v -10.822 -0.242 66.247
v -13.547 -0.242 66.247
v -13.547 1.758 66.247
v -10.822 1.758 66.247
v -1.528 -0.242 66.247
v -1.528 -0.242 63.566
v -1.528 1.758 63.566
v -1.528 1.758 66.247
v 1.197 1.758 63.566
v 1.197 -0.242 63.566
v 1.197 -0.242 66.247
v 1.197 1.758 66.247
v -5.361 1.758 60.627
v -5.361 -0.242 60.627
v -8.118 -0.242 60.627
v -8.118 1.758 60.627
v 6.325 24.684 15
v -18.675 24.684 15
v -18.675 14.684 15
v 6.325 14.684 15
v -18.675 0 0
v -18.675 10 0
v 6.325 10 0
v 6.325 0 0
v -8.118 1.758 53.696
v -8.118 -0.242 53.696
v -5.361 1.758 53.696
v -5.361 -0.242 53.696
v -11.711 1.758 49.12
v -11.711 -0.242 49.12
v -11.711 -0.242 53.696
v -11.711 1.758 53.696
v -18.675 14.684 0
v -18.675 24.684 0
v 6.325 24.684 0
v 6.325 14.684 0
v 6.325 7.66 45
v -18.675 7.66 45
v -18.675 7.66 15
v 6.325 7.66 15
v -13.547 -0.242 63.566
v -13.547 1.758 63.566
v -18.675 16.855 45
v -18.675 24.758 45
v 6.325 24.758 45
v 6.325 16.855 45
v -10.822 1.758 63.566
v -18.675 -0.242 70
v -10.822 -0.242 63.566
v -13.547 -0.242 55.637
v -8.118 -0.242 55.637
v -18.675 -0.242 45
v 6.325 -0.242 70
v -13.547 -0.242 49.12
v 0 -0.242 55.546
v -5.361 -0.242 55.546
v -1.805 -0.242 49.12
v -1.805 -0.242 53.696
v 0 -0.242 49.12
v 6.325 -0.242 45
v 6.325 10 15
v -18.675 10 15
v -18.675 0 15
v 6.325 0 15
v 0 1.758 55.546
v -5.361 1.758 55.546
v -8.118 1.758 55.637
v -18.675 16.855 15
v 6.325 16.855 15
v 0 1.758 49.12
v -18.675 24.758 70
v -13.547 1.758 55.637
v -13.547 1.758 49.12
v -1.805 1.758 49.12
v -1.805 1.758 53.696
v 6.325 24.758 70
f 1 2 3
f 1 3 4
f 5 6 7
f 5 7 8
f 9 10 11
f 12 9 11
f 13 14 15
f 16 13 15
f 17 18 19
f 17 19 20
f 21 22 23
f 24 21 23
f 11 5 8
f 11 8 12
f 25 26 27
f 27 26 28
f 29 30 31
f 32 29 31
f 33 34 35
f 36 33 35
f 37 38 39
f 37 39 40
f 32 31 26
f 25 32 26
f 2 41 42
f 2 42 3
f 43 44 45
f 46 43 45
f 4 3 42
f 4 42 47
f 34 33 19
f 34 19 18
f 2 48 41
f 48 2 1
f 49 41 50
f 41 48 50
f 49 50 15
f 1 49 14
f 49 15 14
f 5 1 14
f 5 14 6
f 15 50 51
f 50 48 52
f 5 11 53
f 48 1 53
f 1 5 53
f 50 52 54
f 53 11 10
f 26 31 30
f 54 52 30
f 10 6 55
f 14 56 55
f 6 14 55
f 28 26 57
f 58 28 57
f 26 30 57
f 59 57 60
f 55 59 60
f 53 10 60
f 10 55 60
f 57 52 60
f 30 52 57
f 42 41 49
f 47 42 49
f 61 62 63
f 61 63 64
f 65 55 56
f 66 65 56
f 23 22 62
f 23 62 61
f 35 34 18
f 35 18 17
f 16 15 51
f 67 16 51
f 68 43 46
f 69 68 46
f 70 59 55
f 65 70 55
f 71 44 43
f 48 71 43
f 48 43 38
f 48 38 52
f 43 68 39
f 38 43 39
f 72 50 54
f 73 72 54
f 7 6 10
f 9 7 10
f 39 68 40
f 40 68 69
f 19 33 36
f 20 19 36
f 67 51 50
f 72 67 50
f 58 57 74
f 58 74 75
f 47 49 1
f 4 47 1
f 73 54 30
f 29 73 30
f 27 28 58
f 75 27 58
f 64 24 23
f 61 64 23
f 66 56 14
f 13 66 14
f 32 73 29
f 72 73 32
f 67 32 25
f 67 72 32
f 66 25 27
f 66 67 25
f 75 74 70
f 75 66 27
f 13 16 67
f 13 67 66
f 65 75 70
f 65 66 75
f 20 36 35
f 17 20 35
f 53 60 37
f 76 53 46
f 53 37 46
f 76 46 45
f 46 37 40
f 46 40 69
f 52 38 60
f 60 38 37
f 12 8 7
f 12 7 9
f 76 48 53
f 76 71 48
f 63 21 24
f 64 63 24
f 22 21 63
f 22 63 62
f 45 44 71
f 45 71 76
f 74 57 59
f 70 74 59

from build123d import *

# Parameters (mm, degrees)
F0_W     = 25
F0_H     = 10
F1_DEPTH = 15
F2_W     = 25
F2_H     = 7.0236558931
F2_H_2   = 2.1715385774
F3_DEPTH = 30
F4_W     = 25
F4_H     = 7.9024027648
F4_H_2   = 9.1951944705
F5_DEPTH = 25
F6_W     = 2.7250722051
F6_H     = 2.6801675558
F6_W_2   = 3.5557212541
F6_H_2   = 1.8495172262
F6_W_3   = 1.8048038473
F6_H_3   = 4.5763812959
F6_W_4   = 3.5931905732
F6_H_4   = 1.9403398037
F6_W_5   = 1.8357587978
F7_DEPTH = 2


with BuildPart() as f1:
    # F0 (on Top) → F1 (new body)
    with BuildSketch(Plane.XY):
        with Locations((-6.1746991399, 19.6837366811)):
            Rectangle(F0_W, F0_H)
    extrude(amount=F1_DEPTH)


with BuildPart() as f1b:
    # F0 (on Top) → F1, piece 2 (new body)
    with BuildSketch(Plane.XY):
        with Locations((-6.1746991399, 5)):
            Rectangle(F0_W, F0_H)
    extrude(amount=F1_DEPTH)


with BuildPart() as f3:
    # F2 (on face) → F3 (new body)
    with BuildSketch(Plane.XY.offset(15)):
        with Locations((-6.1746991399, 11.1719087345)):
            Rectangle(F2_W, F2_H)
        with Locations((-6.1746991399, 15.7695059697)):
            Rectangle(F2_W, F2_H_2)
    extrude(amount=F3_DEPTH)

    # F4 (on face) → F5 (join)
    with BuildSketch(Plane.XY.offset(45)):
        with Locations((-6.1746991399, 3.7088794056)):
            Rectangle(F4_W, F4_H)
        with Locations((-6.1746991399, 12.2576780232)):
            Rectangle(F4_W, F4_H_2)
        with Locations((-6.1746991399, 20.8064766408)):
            Rectangle(F4_W, F4_H)
    extrude(amount=F5_DEPTH)

    # F6 (on face) → F7 (cut)
    with BuildSketch(Plane.XZ.offset(0.2423219768)):
        with Locations((-12.1841728687, 64.9064481258)):
            Rectangle(F6_W, F6_H)
        with Locations((-0.1652254111, 64.9064481258)):
            Rectangle(F6_W, F6_H)
        Polygon((-5.3605251014, 60.6265217066), (-8.1177596003, 60.6265217066), (-8.1177596003, 55.6365549564), (-8.1177596003, 53.6962151527), (-5.3605251014, 53.6962151527), (-5.3605251014, 55.545732379), align=None)
        with Locations((-3.5826644744, 54.6209737659)):
            Rectangle(F6_W_2, F6_H_2)
        with Locations((-0.9024019237, 54.6209737659)):
            Rectangle(F6_W_3, F6_H_2)
        with Locations((-0.9024019237, 51.4080245048)):
            Rectangle(F6_W_3, F6_H_3)
        with Locations((-9.9143548869, 54.6663850546)):
            Rectangle(F6_W_4, F6_H_4)
        with Locations((-12.6288295723, 54.6663850546)):
            Rectangle(F6_W_5, F6_H_4)
        with Locations((-12.6288295723, 51.4080245048)):
            Rectangle(F6_W_5, F6_H_3)
    extrude(amount=-F7_DEPTH, mode=Mode.SUBTRACT)


solid = Compound([f1.part, f1b.part, f3.part])
